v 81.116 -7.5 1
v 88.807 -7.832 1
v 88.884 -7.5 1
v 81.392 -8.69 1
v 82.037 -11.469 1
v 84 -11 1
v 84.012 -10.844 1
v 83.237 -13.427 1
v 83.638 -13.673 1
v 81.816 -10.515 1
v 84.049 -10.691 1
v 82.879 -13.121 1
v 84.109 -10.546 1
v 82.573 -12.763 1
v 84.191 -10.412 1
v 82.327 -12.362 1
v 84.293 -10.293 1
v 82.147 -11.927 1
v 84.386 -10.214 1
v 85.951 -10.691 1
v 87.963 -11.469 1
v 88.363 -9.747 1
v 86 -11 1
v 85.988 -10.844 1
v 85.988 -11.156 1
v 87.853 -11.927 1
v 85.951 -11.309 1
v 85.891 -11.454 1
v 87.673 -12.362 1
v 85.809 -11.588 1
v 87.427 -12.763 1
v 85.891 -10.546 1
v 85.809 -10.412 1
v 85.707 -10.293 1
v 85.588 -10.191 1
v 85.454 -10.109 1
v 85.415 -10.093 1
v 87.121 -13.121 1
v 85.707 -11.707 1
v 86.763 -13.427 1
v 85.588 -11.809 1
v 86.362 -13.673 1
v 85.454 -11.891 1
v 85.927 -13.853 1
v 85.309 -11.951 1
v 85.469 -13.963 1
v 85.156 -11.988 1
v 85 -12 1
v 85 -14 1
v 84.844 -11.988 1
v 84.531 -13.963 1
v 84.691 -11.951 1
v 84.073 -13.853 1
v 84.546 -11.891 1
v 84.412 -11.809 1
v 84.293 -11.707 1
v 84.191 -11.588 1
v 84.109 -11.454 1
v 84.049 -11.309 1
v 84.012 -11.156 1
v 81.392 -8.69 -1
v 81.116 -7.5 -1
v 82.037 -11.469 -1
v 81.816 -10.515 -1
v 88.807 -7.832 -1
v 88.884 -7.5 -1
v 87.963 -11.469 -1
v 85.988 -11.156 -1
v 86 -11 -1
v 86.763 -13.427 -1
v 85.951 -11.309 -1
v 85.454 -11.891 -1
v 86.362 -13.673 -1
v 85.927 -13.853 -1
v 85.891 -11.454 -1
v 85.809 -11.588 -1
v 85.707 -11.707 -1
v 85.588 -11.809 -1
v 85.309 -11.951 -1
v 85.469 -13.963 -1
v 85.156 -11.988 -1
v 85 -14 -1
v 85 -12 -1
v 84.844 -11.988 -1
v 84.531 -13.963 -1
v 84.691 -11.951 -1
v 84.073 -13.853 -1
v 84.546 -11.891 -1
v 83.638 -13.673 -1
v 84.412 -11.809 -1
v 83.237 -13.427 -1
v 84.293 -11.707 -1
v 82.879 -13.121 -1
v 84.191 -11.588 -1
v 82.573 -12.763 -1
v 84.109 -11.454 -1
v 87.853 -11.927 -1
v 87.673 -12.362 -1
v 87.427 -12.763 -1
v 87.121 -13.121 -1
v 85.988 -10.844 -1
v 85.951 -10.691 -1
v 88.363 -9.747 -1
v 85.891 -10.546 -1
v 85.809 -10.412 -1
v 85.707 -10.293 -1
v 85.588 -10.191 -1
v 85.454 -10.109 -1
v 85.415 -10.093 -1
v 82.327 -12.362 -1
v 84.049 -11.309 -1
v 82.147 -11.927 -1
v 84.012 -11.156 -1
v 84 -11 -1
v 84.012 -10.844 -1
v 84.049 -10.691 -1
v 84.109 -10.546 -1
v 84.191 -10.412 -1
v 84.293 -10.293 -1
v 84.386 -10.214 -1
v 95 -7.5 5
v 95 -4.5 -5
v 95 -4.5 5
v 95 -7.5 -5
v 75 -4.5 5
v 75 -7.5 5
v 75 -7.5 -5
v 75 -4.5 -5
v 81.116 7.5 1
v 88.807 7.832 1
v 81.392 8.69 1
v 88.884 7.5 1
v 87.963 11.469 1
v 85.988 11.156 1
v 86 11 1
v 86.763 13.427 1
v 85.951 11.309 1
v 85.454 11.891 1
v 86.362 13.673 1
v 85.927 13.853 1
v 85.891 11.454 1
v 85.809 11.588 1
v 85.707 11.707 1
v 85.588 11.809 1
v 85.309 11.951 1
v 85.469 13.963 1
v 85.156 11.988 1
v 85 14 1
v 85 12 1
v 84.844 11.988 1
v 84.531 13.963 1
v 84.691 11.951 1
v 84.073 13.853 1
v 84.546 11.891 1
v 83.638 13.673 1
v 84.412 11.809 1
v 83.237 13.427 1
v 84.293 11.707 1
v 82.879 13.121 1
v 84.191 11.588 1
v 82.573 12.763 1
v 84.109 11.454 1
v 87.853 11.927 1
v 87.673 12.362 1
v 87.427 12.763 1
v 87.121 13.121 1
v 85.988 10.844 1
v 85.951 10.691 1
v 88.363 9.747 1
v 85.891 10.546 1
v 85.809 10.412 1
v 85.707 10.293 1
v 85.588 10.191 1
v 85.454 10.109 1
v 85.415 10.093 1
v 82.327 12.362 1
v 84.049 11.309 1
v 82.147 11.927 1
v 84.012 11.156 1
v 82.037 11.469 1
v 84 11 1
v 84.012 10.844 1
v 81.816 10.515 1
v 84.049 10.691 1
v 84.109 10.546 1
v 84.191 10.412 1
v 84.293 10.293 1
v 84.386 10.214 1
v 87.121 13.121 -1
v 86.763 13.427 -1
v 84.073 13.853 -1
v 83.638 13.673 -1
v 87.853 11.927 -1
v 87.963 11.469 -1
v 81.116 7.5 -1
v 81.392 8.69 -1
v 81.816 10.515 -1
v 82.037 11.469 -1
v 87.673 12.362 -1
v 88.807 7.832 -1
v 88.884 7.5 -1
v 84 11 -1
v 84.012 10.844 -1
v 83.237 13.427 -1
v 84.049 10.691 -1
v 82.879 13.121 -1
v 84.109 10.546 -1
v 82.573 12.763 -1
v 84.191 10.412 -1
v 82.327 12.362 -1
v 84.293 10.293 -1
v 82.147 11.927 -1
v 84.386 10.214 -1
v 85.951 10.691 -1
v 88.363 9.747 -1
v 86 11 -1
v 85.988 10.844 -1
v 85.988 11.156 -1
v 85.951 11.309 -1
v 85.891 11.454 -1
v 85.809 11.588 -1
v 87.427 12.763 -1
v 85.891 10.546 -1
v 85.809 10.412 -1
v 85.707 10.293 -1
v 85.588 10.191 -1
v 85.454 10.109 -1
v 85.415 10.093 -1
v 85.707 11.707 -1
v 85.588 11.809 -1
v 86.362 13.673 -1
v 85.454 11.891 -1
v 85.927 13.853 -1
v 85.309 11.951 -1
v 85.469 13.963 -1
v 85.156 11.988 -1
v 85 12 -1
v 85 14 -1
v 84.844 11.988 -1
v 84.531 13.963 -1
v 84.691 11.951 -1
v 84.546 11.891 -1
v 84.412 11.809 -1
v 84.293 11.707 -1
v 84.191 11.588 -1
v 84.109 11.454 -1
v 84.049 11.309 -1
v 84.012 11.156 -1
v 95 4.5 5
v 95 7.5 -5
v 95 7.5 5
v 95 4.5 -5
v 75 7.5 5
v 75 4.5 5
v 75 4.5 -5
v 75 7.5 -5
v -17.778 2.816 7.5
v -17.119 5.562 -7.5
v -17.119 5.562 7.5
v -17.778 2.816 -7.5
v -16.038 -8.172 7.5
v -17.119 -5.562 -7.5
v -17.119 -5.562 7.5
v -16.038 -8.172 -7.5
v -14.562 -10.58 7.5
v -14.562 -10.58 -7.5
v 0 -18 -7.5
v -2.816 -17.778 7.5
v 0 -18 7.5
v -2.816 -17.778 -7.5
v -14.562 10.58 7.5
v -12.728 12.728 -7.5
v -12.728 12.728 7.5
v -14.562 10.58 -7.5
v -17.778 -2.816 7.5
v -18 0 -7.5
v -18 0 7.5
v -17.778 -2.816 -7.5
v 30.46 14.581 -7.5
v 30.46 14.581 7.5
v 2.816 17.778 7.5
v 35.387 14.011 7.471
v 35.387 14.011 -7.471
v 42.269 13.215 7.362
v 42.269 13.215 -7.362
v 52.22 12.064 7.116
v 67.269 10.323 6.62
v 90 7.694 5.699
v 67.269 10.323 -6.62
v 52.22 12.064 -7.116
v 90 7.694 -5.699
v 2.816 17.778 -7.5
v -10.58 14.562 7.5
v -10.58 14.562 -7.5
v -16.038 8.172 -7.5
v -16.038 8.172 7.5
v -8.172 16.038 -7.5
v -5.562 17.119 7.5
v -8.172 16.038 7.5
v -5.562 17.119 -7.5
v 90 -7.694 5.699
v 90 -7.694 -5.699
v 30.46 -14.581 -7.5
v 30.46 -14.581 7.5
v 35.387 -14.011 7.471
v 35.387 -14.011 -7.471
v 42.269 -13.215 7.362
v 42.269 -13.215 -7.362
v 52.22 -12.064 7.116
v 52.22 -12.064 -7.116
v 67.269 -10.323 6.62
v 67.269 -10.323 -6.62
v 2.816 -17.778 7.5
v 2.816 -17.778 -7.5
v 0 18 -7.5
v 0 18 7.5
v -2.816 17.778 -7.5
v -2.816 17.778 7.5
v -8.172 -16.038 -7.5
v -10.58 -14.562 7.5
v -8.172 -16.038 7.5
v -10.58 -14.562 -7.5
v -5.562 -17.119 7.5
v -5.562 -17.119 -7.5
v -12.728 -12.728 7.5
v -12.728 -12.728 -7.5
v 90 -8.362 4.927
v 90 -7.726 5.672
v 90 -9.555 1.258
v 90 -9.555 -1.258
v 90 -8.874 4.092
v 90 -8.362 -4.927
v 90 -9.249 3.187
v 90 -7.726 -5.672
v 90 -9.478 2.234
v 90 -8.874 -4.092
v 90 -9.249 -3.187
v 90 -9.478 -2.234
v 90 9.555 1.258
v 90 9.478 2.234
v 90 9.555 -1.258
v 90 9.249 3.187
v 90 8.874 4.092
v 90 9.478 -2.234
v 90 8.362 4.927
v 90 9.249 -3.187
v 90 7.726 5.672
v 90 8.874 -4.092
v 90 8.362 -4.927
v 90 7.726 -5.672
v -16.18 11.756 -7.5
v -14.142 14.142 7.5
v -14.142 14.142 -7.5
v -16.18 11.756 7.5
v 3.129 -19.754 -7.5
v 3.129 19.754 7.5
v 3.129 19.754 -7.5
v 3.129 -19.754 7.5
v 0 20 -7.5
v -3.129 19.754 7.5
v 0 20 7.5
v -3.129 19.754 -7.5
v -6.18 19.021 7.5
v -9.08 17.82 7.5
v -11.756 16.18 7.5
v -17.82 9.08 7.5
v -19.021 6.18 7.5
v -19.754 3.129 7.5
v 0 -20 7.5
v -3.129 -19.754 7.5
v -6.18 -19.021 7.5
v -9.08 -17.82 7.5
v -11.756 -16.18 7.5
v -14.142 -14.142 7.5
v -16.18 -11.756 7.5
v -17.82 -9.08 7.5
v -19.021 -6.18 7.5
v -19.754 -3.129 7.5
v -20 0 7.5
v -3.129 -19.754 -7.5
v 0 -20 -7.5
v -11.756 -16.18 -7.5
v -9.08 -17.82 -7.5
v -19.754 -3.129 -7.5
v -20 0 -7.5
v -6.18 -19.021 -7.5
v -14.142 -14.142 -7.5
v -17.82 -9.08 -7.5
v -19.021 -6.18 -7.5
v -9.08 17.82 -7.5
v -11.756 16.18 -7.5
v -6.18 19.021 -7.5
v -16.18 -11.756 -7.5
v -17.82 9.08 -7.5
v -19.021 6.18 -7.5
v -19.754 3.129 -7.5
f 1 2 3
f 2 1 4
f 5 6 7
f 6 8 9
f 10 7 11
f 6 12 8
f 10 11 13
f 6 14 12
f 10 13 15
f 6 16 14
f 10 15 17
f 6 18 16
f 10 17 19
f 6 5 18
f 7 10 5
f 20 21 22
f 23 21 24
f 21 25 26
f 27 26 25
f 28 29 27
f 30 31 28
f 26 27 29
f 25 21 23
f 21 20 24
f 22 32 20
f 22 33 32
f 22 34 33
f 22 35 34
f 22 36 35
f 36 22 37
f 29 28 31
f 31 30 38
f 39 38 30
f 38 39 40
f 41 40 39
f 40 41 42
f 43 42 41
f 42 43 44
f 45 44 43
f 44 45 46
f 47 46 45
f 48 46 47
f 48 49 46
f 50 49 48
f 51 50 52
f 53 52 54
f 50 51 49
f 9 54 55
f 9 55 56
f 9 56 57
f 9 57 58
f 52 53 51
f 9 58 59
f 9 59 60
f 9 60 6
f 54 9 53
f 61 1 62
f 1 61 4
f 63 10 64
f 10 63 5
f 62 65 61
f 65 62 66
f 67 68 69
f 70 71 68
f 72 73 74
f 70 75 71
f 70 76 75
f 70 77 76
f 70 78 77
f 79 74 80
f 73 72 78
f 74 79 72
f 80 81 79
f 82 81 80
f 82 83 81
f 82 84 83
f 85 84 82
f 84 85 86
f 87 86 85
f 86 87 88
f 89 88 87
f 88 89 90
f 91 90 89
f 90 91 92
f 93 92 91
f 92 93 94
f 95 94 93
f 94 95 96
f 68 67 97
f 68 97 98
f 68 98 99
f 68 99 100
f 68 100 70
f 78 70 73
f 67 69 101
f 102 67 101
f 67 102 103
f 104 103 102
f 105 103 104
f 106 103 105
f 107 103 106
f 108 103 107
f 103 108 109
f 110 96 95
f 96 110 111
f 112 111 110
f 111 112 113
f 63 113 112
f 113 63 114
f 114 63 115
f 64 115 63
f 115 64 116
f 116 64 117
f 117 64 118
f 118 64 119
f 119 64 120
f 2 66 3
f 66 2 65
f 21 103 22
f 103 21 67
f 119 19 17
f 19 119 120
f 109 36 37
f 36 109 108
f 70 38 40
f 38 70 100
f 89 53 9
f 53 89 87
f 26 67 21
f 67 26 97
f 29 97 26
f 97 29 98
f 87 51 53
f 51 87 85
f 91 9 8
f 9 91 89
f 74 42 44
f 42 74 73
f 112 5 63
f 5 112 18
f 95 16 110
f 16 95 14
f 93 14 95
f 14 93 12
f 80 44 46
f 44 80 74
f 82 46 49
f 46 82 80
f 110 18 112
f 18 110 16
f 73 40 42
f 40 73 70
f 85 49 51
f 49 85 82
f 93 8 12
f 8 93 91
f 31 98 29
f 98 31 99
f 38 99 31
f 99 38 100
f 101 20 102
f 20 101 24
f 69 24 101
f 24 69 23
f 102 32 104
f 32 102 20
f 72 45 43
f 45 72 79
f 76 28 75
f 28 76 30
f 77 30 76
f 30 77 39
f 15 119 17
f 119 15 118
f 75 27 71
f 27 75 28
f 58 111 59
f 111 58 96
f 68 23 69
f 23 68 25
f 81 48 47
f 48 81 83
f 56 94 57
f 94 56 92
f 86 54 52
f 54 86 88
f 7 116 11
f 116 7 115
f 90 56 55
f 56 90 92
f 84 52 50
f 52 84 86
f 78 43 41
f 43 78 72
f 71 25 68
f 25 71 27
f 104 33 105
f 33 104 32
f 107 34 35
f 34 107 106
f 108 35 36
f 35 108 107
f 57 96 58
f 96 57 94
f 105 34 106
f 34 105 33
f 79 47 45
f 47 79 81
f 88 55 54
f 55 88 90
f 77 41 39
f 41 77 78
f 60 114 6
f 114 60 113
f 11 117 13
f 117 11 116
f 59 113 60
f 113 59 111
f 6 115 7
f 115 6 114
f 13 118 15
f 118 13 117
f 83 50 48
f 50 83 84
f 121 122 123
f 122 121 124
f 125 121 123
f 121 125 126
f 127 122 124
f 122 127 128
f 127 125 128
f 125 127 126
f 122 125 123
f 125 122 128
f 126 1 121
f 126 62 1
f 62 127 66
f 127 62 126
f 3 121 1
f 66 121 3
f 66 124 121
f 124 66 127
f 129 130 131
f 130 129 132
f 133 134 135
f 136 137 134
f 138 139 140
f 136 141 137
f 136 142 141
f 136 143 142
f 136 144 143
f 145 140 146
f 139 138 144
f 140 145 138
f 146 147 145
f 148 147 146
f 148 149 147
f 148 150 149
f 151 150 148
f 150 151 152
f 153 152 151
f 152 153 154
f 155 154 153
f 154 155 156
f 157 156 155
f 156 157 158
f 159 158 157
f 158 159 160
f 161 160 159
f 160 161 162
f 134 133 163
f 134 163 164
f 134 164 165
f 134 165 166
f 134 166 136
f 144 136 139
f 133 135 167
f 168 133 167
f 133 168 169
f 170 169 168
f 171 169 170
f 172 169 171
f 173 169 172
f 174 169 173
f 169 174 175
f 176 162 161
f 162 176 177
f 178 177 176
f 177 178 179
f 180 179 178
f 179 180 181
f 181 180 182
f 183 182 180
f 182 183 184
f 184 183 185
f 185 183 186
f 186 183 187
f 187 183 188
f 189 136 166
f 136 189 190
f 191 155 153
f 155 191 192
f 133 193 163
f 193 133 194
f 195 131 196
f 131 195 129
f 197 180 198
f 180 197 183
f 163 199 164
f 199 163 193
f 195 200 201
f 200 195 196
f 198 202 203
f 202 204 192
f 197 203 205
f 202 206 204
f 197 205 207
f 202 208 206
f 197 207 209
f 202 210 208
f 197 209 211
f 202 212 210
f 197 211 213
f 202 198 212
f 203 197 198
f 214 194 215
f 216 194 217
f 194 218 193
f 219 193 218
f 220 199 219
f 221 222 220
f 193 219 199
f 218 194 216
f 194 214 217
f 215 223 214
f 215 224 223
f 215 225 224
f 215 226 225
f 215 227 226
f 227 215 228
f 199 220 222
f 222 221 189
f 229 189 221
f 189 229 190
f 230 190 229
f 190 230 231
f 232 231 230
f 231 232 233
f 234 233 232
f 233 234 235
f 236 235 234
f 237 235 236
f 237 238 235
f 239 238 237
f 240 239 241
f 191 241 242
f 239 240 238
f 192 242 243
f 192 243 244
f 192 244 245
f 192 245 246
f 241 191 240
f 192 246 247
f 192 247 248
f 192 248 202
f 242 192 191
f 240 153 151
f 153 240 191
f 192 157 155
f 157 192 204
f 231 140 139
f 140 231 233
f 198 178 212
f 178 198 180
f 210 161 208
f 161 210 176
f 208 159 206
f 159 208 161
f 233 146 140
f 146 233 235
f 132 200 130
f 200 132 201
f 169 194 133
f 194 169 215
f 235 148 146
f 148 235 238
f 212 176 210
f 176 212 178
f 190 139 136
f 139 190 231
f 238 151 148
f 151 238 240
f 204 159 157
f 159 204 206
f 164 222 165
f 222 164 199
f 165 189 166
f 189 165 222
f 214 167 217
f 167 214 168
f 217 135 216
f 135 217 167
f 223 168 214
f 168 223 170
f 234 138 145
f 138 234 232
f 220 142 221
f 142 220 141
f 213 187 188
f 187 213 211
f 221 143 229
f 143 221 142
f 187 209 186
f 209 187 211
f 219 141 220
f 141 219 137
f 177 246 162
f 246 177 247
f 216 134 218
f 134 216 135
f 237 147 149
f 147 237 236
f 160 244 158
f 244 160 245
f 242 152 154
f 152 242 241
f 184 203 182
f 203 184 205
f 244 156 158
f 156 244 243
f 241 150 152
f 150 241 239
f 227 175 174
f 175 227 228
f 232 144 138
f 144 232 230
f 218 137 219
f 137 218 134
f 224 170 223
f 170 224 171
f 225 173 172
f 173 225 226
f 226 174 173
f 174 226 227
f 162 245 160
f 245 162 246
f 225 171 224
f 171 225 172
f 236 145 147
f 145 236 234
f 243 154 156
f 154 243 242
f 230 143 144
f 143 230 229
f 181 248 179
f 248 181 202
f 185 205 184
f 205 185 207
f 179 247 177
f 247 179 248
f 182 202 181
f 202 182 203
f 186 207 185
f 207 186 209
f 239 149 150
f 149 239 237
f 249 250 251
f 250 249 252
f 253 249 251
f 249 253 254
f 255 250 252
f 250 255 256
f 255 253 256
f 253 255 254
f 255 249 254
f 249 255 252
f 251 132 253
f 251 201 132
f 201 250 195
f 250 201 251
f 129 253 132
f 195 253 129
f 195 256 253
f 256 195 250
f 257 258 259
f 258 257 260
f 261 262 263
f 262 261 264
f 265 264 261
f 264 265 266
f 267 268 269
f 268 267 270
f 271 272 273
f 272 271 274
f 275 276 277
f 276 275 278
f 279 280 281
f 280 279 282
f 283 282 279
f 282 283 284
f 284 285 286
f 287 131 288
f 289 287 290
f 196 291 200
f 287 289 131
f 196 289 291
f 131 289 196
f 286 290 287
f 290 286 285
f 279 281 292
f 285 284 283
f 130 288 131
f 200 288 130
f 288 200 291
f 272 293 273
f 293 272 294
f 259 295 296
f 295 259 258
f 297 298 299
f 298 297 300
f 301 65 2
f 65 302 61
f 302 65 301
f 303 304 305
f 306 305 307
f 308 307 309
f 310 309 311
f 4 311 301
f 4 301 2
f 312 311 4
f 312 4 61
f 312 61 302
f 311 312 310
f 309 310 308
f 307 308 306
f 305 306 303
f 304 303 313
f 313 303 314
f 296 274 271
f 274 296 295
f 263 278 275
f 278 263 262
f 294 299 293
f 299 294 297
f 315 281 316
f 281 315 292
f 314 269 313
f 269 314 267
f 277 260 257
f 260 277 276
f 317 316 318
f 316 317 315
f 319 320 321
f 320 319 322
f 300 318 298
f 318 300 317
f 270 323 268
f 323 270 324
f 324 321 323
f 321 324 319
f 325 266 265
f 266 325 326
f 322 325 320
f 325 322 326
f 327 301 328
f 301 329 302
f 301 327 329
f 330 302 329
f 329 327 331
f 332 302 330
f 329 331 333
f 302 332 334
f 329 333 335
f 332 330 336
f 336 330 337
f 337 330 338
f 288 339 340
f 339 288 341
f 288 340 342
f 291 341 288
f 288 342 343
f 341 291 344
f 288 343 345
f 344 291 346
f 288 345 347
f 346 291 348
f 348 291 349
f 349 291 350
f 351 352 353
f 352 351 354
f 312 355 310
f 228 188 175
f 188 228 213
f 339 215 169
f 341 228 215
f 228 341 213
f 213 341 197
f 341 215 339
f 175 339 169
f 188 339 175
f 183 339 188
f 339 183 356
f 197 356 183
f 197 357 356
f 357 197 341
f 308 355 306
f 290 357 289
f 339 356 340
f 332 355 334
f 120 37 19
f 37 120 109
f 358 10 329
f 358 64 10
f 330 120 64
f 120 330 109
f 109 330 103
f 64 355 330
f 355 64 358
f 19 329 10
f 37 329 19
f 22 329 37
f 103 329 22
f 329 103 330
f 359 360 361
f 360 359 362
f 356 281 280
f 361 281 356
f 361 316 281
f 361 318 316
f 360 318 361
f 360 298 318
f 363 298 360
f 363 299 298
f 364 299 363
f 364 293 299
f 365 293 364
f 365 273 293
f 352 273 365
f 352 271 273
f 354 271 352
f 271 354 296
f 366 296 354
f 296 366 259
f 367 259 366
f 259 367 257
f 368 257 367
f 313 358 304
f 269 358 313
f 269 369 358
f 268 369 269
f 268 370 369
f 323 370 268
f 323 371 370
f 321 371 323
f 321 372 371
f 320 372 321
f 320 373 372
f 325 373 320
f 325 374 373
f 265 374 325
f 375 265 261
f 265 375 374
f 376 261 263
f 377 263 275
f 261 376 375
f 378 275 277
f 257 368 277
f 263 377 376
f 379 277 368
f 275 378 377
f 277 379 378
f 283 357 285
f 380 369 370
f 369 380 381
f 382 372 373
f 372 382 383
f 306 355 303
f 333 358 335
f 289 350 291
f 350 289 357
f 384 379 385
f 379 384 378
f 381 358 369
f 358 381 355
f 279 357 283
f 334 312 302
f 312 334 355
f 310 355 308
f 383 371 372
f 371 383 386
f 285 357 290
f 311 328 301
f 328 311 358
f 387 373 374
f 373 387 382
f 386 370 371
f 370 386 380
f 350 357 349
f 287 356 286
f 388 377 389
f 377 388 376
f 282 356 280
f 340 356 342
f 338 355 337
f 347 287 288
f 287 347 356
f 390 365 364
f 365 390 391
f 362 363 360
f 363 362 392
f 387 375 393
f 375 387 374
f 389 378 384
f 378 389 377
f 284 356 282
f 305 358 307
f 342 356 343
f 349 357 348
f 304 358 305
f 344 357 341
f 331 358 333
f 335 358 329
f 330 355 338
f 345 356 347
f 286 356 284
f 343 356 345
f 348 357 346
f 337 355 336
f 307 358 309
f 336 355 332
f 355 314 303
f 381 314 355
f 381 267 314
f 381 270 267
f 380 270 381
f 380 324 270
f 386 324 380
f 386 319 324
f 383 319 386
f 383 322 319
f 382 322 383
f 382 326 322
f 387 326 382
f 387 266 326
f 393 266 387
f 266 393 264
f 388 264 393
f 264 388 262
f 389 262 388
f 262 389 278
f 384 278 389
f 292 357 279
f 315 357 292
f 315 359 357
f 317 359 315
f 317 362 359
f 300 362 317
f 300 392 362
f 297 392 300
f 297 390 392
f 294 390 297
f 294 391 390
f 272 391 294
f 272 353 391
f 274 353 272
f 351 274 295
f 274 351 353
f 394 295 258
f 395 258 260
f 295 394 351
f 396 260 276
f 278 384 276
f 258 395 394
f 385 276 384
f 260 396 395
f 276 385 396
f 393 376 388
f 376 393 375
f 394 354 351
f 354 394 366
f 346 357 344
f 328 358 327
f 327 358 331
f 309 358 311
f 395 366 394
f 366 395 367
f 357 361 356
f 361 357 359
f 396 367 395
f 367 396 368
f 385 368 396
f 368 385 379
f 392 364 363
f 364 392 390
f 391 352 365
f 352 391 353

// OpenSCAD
// Units in mm
//main body
$fn=40;
module body() {
	difference() {
		hull() {
			cylinder(h=15, r=20, center=true);
			translate([100, 0, 0])
			rotate([0, 90, 0])
			cylinder(h=15, r=7.5, center=true);
		}

		union() {
			hull() {
				cylinder(h=16, r=18, center=true);
				translate([100, 0, 0])
				cylinder(h=16, r=6.5, center=true);
			}
			translate([100, 0, 0])
			cube([20, 20, 20], center=true);
			translate([85, -6, 0])
			jaw();
			mirror([0, 1, 0])
			translate([85, -6, 0])
			jaw();
			}
	}
}
body();

module jaw() {
	cube([20, 3, 10], center=true);

	difference() {
		hull() {
			translate([0, -5, 0])
			cylinder(r=3, h=2, center=true);
			cube([8, 2, 2], center=true);
		}
		translate([0, -5, 0])
		cylinder(r=1, h=4, center=true);
	}
}
			translate([85, -6, 0])
			jaw();
			mirror([0, 1, 0])
			translate([85, -6, 0])
			jaw();
